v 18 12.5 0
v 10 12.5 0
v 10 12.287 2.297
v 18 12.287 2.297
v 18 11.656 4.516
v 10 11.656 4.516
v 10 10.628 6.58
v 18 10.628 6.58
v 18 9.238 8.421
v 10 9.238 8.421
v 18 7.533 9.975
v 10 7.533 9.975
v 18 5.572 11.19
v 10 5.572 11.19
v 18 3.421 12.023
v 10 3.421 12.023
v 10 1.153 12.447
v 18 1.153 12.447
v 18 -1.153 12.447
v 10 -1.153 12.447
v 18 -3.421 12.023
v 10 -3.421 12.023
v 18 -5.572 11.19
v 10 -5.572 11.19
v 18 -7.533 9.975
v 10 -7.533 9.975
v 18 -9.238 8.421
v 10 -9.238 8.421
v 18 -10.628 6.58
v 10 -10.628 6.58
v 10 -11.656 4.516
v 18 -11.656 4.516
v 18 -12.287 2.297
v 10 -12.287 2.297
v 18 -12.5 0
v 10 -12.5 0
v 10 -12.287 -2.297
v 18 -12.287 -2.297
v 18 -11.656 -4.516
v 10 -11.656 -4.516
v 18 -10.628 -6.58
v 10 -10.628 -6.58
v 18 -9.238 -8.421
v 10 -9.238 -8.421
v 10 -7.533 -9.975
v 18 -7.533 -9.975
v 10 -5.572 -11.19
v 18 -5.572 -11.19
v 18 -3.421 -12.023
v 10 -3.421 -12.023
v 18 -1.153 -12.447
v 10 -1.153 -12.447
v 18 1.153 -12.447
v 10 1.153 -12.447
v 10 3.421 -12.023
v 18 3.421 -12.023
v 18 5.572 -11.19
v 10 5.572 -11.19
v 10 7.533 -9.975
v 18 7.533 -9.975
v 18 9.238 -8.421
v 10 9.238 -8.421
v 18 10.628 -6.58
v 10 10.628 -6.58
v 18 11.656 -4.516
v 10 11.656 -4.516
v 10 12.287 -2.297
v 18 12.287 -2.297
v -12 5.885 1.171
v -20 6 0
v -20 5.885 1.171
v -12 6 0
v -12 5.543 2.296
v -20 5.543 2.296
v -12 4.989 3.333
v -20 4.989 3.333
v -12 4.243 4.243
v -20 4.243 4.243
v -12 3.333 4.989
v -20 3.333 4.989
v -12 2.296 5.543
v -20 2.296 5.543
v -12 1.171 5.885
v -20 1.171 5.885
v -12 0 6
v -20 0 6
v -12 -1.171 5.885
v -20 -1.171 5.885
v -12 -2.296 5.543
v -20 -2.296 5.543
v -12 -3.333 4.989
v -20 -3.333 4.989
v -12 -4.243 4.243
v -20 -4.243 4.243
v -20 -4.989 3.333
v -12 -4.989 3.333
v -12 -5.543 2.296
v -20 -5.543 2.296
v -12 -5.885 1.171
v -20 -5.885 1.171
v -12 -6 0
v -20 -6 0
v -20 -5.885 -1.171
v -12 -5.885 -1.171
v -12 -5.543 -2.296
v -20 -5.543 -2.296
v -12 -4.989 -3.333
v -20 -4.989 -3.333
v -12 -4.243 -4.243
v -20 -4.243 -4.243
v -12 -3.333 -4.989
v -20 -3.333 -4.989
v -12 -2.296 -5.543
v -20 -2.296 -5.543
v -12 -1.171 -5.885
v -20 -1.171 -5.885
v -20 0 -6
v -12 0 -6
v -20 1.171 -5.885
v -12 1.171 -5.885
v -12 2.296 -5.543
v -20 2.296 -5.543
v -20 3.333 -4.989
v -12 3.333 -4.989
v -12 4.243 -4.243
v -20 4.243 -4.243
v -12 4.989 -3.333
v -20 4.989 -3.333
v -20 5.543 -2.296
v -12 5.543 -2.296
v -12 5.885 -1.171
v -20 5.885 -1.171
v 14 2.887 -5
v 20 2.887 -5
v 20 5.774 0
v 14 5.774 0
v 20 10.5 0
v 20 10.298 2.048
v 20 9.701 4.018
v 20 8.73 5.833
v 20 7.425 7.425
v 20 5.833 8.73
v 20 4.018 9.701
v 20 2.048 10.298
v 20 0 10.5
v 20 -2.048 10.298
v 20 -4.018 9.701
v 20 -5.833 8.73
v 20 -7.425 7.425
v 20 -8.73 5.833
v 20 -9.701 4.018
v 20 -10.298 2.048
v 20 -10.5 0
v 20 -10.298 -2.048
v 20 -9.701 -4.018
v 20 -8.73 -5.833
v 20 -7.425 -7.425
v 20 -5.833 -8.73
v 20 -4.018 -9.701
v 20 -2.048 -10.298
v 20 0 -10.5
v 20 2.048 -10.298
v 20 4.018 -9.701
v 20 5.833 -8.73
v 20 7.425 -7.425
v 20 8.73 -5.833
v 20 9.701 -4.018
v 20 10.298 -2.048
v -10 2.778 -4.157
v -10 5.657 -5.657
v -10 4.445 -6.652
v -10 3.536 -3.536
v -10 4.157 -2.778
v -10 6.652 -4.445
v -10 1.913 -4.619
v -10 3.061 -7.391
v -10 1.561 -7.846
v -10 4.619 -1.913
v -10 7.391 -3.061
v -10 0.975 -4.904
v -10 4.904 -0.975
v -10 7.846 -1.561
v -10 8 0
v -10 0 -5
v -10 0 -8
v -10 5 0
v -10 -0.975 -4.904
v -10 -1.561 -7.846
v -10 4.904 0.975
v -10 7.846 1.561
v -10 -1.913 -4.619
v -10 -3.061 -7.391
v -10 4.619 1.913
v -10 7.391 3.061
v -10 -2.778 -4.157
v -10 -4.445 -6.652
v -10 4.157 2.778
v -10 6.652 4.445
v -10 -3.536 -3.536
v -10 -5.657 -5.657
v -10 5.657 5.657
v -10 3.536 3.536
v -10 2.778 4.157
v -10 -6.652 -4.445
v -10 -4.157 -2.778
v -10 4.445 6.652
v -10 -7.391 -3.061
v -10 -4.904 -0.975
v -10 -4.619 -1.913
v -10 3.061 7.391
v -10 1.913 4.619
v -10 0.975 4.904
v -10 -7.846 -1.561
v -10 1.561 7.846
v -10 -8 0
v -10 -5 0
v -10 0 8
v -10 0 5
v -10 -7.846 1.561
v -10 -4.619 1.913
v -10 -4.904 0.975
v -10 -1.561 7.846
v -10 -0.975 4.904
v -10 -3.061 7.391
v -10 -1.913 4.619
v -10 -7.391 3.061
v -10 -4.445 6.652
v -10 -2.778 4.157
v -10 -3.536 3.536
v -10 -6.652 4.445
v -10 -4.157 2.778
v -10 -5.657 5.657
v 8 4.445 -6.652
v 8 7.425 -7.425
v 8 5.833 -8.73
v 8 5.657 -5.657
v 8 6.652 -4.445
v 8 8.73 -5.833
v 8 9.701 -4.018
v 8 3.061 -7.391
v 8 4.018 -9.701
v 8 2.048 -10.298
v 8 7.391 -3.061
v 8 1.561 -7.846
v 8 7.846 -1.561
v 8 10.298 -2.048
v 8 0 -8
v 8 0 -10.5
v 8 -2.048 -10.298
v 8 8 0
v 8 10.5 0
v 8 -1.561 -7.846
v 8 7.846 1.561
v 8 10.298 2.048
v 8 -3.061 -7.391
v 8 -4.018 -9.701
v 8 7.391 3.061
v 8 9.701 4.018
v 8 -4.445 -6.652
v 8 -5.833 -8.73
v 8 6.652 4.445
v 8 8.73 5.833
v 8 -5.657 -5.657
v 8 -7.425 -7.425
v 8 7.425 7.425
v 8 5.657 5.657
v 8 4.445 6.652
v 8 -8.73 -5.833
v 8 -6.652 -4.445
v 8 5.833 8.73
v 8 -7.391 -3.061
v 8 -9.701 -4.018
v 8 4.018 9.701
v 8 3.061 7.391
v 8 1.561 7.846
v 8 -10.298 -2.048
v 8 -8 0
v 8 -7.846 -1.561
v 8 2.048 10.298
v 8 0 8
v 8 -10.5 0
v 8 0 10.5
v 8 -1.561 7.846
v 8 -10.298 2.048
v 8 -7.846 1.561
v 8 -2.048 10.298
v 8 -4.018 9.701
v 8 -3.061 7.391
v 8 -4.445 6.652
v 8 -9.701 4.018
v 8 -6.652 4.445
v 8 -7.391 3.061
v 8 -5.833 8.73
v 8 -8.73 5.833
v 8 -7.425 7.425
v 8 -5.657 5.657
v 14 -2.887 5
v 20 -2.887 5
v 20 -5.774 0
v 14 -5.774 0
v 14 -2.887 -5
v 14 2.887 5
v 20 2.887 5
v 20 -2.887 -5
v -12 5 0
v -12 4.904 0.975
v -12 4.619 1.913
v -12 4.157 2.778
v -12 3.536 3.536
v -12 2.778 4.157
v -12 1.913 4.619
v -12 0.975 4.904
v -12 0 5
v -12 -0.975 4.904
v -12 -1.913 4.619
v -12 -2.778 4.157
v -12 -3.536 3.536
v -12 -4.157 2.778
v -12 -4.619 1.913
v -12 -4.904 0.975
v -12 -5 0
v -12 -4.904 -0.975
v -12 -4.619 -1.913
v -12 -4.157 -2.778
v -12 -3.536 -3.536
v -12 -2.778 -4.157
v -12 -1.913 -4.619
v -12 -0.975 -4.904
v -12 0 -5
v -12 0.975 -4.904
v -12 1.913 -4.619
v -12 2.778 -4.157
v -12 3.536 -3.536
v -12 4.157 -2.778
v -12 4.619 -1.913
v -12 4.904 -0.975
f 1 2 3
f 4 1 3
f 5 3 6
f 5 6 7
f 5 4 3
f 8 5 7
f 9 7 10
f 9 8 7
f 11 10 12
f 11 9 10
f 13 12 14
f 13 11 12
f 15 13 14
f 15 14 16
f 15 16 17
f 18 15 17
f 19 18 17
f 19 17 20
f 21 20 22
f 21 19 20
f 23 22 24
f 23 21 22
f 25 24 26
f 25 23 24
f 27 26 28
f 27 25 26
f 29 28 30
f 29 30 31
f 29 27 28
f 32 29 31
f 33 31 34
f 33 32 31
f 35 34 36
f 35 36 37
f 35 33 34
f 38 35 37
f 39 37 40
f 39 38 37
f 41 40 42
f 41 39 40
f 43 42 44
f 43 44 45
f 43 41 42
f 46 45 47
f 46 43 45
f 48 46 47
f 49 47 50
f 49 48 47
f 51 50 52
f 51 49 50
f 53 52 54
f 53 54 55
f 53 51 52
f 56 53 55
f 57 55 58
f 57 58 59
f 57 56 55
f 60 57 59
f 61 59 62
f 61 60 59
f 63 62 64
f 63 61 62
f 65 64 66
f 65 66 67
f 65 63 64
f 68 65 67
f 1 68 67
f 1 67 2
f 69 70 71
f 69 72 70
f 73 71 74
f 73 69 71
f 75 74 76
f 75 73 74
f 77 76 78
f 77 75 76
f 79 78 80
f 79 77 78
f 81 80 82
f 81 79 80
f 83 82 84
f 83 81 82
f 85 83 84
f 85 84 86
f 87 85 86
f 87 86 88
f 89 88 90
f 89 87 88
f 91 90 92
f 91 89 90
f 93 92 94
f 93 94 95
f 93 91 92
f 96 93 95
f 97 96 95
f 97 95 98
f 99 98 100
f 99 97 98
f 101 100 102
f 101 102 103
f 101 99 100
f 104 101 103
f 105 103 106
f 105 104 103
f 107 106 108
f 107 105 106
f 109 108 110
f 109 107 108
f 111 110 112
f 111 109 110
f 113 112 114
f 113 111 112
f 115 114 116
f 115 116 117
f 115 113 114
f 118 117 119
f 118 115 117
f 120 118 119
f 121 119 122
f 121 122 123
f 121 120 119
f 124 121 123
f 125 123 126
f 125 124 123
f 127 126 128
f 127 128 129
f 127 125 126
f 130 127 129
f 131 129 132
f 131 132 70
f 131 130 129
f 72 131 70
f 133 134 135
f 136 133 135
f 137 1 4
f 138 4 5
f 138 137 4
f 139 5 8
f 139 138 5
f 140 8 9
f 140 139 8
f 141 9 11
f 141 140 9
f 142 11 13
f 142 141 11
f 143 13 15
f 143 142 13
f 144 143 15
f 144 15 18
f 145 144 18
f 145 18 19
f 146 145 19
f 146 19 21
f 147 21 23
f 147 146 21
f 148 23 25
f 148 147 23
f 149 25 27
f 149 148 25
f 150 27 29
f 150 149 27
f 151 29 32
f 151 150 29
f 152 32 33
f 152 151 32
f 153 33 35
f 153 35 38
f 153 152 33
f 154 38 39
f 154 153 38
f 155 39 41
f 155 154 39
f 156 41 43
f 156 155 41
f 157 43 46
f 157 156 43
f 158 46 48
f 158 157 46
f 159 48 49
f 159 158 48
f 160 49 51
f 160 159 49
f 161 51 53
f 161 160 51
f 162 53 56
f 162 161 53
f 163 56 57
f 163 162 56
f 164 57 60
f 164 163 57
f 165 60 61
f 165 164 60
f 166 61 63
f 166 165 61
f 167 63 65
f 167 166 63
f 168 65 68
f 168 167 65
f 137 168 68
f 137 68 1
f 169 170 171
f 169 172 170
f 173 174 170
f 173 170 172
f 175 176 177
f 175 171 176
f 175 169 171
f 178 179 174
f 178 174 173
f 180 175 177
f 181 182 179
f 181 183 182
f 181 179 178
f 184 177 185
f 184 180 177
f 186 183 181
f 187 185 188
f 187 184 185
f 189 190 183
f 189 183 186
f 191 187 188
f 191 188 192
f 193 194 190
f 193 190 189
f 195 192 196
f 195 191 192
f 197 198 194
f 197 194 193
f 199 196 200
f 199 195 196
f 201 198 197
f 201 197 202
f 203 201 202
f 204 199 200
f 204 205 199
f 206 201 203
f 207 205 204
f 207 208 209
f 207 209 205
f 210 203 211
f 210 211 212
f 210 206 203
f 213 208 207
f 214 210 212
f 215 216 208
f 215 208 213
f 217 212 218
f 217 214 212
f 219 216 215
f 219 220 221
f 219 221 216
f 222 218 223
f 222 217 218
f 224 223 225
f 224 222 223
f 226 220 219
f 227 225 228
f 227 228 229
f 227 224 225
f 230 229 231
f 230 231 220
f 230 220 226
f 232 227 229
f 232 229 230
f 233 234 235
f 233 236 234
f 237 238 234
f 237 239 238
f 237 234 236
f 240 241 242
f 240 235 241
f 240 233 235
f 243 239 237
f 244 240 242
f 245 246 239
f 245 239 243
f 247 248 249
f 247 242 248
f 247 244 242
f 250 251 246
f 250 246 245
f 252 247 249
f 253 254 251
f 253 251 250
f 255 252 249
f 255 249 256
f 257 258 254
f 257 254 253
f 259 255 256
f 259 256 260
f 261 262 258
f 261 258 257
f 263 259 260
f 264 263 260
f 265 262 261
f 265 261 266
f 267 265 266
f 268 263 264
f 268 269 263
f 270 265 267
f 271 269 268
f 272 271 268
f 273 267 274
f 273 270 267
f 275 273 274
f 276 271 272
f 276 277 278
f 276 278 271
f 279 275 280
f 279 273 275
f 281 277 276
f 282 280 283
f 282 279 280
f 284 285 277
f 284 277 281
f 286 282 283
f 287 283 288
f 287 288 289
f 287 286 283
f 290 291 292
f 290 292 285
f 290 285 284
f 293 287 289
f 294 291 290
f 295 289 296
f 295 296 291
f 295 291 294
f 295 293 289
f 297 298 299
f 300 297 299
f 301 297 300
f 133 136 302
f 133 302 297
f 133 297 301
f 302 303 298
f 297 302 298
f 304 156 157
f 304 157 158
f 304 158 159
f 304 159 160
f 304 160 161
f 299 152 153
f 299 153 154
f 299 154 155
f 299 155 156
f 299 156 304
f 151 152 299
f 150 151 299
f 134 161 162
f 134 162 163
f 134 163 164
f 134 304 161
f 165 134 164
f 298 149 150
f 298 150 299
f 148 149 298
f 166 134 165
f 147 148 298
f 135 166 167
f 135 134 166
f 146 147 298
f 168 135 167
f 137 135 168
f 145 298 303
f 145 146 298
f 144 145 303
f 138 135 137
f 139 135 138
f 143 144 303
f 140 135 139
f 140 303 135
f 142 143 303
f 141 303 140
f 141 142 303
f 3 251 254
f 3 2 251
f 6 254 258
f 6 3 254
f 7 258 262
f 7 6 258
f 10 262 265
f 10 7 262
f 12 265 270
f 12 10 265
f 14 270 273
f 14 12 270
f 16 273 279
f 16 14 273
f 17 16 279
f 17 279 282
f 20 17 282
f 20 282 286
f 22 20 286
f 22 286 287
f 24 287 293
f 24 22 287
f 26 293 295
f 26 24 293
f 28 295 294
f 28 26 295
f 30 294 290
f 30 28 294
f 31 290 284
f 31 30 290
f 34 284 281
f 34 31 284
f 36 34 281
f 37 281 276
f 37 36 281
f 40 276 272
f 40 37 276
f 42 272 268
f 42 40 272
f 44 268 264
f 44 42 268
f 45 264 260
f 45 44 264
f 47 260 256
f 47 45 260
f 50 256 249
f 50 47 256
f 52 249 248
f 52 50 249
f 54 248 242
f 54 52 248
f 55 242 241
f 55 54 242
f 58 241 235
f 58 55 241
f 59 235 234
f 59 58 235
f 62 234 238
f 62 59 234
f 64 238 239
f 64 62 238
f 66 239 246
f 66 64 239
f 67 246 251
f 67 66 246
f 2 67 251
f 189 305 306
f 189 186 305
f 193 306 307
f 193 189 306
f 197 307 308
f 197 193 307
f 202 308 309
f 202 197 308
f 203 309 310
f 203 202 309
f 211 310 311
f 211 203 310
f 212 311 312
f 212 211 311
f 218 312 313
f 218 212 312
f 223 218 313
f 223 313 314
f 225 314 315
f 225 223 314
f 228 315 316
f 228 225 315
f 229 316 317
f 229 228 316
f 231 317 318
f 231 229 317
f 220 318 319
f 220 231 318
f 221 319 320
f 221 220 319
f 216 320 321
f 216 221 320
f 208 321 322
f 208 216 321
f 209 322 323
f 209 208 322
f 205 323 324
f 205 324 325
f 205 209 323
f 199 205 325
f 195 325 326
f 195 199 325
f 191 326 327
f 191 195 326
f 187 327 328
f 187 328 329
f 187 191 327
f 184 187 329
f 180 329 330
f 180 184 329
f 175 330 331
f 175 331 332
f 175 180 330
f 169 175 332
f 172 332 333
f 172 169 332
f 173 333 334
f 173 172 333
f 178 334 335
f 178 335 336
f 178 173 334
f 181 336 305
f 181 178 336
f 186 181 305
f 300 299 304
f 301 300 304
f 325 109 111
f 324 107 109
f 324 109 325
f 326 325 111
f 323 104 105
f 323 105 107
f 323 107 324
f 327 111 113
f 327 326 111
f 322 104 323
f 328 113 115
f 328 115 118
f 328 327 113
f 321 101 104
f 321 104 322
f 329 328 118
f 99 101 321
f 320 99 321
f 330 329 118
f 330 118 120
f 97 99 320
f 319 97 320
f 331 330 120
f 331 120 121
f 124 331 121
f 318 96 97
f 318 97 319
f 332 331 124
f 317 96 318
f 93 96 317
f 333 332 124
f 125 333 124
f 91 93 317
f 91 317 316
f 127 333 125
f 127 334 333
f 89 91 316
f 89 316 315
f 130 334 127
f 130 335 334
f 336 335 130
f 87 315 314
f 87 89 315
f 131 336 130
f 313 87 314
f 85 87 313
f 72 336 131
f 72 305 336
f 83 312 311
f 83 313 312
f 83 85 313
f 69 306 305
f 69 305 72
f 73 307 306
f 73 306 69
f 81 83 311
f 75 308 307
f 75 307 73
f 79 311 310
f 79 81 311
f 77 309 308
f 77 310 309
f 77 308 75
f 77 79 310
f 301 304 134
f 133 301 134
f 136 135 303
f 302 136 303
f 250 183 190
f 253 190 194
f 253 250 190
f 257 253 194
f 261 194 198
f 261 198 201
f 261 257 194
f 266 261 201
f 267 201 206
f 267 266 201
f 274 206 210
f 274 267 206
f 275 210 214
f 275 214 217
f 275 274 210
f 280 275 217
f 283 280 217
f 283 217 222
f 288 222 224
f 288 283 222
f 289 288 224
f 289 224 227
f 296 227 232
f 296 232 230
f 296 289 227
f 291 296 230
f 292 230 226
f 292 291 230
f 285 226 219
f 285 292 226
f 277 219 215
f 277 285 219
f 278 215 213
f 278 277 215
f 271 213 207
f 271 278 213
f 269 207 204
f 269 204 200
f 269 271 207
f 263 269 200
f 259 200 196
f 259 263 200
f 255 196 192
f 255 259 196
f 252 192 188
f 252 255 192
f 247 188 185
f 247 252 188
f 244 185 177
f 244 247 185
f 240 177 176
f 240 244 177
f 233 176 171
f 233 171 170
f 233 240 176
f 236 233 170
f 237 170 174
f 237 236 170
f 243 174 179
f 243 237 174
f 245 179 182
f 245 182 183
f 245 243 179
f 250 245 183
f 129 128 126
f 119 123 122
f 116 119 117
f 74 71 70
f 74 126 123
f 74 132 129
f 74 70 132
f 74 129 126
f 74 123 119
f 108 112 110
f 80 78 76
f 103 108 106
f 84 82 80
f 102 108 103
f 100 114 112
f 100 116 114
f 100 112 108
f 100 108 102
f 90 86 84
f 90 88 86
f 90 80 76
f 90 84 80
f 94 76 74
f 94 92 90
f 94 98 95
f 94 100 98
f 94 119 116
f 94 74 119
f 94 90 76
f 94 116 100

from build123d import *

# Parameters (mm, degrees)
CUT_EXTRUDE1_DEPTH      = 1
CUT_EXTRUDE1_DEPTH_BACK = 6


with BuildPart() as part:
    # Sketch1 → Revolve1 (revolve)
    with BuildSketch(Plane.XY):
        Polygon((-20, 0), (-20, 6), (-12, 6), (-12, 5), (-10, 5), (-10, 8), (8, 8), (8, 10.5), (10, 12.5), (18, 12.5), (20, 10.5), (20, 0), align=None)
    revolve(axis=Axis((-20, 0, 0), (1, 0, 0)))

    # Sketch2 → Cut-Extrude1 (cut, two sides)
    with BuildSketch(Plane(origin=(20, 0, 0), x_dir=(0, 0, -1), z_dir=(1, 0, 0))) as cut_extrude1_sk:
        Polygon((0, 5.773502692), (-5, 2.886751346), (-5, -2.886751346), (0, -5.773502692), (5, -2.886751346), (5, 2.886751346), align=None)
    extrude(amount=CUT_EXTRUDE1_DEPTH, mode=Mode.SUBTRACT)
    extrude(cut_extrude1_sk.sketch, amount=-CUT_EXTRUDE1_DEPTH_BACK, mode=Mode.SUBTRACT)


solid = part.part
